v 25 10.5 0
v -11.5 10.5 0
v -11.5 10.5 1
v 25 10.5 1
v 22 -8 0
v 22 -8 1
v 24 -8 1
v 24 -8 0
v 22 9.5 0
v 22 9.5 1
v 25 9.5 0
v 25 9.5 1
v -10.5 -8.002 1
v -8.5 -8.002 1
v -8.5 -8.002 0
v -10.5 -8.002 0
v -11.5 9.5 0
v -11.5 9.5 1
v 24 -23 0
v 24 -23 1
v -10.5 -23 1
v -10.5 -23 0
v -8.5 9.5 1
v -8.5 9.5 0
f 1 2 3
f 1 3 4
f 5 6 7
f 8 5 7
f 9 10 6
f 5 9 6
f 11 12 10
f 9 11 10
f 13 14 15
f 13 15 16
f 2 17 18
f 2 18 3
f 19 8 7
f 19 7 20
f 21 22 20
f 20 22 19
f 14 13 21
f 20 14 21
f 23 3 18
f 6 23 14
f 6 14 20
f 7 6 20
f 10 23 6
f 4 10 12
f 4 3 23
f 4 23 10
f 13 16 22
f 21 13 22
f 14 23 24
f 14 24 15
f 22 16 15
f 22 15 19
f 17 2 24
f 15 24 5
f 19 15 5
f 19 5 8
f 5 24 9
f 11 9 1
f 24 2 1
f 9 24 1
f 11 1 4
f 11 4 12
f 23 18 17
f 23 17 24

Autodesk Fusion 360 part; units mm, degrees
sketch "Sketch1" plane through (0, 0, 0) normal (0, 0, 1) x (1, 0, 0)
  line L0 (24, 9.5) -> (24, -22)
  line L1 (23, -23) -> (-9, -23)
  line L2 (-10.5, -22) -> (-10.5, 9.5)
  line L3 (-11.5, 10.5) -> (25, 10.5)
  line L4 (25, 10.5) -> (25, 9.5)
  line L5 (-11.5, 9.5) -> (-11.5, 10.5)
  line L6 (-11.5, 9.5) -> (-10.5, 9.5)
  line L7 (24, 9.5) -> (25, 9.5)
  line L8 (-10.5, -22) -> (-10.5, -23)
  line L9 (-10.5, -23) -> (-9, -23)
  line L10 (23, -23) -> (24, -23)
  line L11 (24, -23) -> (24, -22)
  point P0 (24, -23)
  point P1 (-10.5, -23)
  dimension "d3" = 1
  dimension "d4" = 33.5
  dimension "d5" = 1
  dimension "d6" = 34.5
  dimension "d32" = 1
extrude "Extrude3" add sketch "Sketch1" along normal blind 2
sketch "Sketch7" plane through (0, 0, 2) normal (0, 0, 1) x (-1, 0, 0)
  line L0 (10.5, 23) -> (-24, 23)
  line L1 (-24, 23) -> (-24, -9.5)
  line L2 (-24, -9.5) -> (-25, -9.5)
  line L3 (-25, -9.5) -> (-25, -10.5)
  line L4 (-25, -10.5) -> (11.5, -10.5)
  line L5 (11.5, -10.5) -> (11.5, -9.5)
  line L6 (11.5, -9.5) -> (10.5, -9.5)
  line L7 (10.5, -9.5) -> (10.5, 23)
  line L8 (10.5, -9.5) -> (8.5, -9.5)
  line L9 (8.5, -9.5) -> (8.5, 8.0024)
  line L10 (8.5, 8.0024) -> (10.5, 8.0024)
  line L11 (10.5, 8.0024) -> (10.5, -9.5)
  line L12 (-24, -9.5) -> (-22, -9.5)
  line L13 (-22, -9.5) -> (-22, 8)
  line L14 (-22, 8) -> (-24, 8)
  line L15 (-24, 8) -> (-24, -9.5)
  dimension "d26" = 2
  dimension "d27" = 2
extrude "Extrude4" cut sketch "Sketch7" against normal blind 2 contours L7 L8 L9 L10 L11 | L1 L12 L13 L14 L15
extrude "Extrude5" cut 1 faces at (1.6667, -2.1675, 2) along direction (0, 0, -1) blind 1
